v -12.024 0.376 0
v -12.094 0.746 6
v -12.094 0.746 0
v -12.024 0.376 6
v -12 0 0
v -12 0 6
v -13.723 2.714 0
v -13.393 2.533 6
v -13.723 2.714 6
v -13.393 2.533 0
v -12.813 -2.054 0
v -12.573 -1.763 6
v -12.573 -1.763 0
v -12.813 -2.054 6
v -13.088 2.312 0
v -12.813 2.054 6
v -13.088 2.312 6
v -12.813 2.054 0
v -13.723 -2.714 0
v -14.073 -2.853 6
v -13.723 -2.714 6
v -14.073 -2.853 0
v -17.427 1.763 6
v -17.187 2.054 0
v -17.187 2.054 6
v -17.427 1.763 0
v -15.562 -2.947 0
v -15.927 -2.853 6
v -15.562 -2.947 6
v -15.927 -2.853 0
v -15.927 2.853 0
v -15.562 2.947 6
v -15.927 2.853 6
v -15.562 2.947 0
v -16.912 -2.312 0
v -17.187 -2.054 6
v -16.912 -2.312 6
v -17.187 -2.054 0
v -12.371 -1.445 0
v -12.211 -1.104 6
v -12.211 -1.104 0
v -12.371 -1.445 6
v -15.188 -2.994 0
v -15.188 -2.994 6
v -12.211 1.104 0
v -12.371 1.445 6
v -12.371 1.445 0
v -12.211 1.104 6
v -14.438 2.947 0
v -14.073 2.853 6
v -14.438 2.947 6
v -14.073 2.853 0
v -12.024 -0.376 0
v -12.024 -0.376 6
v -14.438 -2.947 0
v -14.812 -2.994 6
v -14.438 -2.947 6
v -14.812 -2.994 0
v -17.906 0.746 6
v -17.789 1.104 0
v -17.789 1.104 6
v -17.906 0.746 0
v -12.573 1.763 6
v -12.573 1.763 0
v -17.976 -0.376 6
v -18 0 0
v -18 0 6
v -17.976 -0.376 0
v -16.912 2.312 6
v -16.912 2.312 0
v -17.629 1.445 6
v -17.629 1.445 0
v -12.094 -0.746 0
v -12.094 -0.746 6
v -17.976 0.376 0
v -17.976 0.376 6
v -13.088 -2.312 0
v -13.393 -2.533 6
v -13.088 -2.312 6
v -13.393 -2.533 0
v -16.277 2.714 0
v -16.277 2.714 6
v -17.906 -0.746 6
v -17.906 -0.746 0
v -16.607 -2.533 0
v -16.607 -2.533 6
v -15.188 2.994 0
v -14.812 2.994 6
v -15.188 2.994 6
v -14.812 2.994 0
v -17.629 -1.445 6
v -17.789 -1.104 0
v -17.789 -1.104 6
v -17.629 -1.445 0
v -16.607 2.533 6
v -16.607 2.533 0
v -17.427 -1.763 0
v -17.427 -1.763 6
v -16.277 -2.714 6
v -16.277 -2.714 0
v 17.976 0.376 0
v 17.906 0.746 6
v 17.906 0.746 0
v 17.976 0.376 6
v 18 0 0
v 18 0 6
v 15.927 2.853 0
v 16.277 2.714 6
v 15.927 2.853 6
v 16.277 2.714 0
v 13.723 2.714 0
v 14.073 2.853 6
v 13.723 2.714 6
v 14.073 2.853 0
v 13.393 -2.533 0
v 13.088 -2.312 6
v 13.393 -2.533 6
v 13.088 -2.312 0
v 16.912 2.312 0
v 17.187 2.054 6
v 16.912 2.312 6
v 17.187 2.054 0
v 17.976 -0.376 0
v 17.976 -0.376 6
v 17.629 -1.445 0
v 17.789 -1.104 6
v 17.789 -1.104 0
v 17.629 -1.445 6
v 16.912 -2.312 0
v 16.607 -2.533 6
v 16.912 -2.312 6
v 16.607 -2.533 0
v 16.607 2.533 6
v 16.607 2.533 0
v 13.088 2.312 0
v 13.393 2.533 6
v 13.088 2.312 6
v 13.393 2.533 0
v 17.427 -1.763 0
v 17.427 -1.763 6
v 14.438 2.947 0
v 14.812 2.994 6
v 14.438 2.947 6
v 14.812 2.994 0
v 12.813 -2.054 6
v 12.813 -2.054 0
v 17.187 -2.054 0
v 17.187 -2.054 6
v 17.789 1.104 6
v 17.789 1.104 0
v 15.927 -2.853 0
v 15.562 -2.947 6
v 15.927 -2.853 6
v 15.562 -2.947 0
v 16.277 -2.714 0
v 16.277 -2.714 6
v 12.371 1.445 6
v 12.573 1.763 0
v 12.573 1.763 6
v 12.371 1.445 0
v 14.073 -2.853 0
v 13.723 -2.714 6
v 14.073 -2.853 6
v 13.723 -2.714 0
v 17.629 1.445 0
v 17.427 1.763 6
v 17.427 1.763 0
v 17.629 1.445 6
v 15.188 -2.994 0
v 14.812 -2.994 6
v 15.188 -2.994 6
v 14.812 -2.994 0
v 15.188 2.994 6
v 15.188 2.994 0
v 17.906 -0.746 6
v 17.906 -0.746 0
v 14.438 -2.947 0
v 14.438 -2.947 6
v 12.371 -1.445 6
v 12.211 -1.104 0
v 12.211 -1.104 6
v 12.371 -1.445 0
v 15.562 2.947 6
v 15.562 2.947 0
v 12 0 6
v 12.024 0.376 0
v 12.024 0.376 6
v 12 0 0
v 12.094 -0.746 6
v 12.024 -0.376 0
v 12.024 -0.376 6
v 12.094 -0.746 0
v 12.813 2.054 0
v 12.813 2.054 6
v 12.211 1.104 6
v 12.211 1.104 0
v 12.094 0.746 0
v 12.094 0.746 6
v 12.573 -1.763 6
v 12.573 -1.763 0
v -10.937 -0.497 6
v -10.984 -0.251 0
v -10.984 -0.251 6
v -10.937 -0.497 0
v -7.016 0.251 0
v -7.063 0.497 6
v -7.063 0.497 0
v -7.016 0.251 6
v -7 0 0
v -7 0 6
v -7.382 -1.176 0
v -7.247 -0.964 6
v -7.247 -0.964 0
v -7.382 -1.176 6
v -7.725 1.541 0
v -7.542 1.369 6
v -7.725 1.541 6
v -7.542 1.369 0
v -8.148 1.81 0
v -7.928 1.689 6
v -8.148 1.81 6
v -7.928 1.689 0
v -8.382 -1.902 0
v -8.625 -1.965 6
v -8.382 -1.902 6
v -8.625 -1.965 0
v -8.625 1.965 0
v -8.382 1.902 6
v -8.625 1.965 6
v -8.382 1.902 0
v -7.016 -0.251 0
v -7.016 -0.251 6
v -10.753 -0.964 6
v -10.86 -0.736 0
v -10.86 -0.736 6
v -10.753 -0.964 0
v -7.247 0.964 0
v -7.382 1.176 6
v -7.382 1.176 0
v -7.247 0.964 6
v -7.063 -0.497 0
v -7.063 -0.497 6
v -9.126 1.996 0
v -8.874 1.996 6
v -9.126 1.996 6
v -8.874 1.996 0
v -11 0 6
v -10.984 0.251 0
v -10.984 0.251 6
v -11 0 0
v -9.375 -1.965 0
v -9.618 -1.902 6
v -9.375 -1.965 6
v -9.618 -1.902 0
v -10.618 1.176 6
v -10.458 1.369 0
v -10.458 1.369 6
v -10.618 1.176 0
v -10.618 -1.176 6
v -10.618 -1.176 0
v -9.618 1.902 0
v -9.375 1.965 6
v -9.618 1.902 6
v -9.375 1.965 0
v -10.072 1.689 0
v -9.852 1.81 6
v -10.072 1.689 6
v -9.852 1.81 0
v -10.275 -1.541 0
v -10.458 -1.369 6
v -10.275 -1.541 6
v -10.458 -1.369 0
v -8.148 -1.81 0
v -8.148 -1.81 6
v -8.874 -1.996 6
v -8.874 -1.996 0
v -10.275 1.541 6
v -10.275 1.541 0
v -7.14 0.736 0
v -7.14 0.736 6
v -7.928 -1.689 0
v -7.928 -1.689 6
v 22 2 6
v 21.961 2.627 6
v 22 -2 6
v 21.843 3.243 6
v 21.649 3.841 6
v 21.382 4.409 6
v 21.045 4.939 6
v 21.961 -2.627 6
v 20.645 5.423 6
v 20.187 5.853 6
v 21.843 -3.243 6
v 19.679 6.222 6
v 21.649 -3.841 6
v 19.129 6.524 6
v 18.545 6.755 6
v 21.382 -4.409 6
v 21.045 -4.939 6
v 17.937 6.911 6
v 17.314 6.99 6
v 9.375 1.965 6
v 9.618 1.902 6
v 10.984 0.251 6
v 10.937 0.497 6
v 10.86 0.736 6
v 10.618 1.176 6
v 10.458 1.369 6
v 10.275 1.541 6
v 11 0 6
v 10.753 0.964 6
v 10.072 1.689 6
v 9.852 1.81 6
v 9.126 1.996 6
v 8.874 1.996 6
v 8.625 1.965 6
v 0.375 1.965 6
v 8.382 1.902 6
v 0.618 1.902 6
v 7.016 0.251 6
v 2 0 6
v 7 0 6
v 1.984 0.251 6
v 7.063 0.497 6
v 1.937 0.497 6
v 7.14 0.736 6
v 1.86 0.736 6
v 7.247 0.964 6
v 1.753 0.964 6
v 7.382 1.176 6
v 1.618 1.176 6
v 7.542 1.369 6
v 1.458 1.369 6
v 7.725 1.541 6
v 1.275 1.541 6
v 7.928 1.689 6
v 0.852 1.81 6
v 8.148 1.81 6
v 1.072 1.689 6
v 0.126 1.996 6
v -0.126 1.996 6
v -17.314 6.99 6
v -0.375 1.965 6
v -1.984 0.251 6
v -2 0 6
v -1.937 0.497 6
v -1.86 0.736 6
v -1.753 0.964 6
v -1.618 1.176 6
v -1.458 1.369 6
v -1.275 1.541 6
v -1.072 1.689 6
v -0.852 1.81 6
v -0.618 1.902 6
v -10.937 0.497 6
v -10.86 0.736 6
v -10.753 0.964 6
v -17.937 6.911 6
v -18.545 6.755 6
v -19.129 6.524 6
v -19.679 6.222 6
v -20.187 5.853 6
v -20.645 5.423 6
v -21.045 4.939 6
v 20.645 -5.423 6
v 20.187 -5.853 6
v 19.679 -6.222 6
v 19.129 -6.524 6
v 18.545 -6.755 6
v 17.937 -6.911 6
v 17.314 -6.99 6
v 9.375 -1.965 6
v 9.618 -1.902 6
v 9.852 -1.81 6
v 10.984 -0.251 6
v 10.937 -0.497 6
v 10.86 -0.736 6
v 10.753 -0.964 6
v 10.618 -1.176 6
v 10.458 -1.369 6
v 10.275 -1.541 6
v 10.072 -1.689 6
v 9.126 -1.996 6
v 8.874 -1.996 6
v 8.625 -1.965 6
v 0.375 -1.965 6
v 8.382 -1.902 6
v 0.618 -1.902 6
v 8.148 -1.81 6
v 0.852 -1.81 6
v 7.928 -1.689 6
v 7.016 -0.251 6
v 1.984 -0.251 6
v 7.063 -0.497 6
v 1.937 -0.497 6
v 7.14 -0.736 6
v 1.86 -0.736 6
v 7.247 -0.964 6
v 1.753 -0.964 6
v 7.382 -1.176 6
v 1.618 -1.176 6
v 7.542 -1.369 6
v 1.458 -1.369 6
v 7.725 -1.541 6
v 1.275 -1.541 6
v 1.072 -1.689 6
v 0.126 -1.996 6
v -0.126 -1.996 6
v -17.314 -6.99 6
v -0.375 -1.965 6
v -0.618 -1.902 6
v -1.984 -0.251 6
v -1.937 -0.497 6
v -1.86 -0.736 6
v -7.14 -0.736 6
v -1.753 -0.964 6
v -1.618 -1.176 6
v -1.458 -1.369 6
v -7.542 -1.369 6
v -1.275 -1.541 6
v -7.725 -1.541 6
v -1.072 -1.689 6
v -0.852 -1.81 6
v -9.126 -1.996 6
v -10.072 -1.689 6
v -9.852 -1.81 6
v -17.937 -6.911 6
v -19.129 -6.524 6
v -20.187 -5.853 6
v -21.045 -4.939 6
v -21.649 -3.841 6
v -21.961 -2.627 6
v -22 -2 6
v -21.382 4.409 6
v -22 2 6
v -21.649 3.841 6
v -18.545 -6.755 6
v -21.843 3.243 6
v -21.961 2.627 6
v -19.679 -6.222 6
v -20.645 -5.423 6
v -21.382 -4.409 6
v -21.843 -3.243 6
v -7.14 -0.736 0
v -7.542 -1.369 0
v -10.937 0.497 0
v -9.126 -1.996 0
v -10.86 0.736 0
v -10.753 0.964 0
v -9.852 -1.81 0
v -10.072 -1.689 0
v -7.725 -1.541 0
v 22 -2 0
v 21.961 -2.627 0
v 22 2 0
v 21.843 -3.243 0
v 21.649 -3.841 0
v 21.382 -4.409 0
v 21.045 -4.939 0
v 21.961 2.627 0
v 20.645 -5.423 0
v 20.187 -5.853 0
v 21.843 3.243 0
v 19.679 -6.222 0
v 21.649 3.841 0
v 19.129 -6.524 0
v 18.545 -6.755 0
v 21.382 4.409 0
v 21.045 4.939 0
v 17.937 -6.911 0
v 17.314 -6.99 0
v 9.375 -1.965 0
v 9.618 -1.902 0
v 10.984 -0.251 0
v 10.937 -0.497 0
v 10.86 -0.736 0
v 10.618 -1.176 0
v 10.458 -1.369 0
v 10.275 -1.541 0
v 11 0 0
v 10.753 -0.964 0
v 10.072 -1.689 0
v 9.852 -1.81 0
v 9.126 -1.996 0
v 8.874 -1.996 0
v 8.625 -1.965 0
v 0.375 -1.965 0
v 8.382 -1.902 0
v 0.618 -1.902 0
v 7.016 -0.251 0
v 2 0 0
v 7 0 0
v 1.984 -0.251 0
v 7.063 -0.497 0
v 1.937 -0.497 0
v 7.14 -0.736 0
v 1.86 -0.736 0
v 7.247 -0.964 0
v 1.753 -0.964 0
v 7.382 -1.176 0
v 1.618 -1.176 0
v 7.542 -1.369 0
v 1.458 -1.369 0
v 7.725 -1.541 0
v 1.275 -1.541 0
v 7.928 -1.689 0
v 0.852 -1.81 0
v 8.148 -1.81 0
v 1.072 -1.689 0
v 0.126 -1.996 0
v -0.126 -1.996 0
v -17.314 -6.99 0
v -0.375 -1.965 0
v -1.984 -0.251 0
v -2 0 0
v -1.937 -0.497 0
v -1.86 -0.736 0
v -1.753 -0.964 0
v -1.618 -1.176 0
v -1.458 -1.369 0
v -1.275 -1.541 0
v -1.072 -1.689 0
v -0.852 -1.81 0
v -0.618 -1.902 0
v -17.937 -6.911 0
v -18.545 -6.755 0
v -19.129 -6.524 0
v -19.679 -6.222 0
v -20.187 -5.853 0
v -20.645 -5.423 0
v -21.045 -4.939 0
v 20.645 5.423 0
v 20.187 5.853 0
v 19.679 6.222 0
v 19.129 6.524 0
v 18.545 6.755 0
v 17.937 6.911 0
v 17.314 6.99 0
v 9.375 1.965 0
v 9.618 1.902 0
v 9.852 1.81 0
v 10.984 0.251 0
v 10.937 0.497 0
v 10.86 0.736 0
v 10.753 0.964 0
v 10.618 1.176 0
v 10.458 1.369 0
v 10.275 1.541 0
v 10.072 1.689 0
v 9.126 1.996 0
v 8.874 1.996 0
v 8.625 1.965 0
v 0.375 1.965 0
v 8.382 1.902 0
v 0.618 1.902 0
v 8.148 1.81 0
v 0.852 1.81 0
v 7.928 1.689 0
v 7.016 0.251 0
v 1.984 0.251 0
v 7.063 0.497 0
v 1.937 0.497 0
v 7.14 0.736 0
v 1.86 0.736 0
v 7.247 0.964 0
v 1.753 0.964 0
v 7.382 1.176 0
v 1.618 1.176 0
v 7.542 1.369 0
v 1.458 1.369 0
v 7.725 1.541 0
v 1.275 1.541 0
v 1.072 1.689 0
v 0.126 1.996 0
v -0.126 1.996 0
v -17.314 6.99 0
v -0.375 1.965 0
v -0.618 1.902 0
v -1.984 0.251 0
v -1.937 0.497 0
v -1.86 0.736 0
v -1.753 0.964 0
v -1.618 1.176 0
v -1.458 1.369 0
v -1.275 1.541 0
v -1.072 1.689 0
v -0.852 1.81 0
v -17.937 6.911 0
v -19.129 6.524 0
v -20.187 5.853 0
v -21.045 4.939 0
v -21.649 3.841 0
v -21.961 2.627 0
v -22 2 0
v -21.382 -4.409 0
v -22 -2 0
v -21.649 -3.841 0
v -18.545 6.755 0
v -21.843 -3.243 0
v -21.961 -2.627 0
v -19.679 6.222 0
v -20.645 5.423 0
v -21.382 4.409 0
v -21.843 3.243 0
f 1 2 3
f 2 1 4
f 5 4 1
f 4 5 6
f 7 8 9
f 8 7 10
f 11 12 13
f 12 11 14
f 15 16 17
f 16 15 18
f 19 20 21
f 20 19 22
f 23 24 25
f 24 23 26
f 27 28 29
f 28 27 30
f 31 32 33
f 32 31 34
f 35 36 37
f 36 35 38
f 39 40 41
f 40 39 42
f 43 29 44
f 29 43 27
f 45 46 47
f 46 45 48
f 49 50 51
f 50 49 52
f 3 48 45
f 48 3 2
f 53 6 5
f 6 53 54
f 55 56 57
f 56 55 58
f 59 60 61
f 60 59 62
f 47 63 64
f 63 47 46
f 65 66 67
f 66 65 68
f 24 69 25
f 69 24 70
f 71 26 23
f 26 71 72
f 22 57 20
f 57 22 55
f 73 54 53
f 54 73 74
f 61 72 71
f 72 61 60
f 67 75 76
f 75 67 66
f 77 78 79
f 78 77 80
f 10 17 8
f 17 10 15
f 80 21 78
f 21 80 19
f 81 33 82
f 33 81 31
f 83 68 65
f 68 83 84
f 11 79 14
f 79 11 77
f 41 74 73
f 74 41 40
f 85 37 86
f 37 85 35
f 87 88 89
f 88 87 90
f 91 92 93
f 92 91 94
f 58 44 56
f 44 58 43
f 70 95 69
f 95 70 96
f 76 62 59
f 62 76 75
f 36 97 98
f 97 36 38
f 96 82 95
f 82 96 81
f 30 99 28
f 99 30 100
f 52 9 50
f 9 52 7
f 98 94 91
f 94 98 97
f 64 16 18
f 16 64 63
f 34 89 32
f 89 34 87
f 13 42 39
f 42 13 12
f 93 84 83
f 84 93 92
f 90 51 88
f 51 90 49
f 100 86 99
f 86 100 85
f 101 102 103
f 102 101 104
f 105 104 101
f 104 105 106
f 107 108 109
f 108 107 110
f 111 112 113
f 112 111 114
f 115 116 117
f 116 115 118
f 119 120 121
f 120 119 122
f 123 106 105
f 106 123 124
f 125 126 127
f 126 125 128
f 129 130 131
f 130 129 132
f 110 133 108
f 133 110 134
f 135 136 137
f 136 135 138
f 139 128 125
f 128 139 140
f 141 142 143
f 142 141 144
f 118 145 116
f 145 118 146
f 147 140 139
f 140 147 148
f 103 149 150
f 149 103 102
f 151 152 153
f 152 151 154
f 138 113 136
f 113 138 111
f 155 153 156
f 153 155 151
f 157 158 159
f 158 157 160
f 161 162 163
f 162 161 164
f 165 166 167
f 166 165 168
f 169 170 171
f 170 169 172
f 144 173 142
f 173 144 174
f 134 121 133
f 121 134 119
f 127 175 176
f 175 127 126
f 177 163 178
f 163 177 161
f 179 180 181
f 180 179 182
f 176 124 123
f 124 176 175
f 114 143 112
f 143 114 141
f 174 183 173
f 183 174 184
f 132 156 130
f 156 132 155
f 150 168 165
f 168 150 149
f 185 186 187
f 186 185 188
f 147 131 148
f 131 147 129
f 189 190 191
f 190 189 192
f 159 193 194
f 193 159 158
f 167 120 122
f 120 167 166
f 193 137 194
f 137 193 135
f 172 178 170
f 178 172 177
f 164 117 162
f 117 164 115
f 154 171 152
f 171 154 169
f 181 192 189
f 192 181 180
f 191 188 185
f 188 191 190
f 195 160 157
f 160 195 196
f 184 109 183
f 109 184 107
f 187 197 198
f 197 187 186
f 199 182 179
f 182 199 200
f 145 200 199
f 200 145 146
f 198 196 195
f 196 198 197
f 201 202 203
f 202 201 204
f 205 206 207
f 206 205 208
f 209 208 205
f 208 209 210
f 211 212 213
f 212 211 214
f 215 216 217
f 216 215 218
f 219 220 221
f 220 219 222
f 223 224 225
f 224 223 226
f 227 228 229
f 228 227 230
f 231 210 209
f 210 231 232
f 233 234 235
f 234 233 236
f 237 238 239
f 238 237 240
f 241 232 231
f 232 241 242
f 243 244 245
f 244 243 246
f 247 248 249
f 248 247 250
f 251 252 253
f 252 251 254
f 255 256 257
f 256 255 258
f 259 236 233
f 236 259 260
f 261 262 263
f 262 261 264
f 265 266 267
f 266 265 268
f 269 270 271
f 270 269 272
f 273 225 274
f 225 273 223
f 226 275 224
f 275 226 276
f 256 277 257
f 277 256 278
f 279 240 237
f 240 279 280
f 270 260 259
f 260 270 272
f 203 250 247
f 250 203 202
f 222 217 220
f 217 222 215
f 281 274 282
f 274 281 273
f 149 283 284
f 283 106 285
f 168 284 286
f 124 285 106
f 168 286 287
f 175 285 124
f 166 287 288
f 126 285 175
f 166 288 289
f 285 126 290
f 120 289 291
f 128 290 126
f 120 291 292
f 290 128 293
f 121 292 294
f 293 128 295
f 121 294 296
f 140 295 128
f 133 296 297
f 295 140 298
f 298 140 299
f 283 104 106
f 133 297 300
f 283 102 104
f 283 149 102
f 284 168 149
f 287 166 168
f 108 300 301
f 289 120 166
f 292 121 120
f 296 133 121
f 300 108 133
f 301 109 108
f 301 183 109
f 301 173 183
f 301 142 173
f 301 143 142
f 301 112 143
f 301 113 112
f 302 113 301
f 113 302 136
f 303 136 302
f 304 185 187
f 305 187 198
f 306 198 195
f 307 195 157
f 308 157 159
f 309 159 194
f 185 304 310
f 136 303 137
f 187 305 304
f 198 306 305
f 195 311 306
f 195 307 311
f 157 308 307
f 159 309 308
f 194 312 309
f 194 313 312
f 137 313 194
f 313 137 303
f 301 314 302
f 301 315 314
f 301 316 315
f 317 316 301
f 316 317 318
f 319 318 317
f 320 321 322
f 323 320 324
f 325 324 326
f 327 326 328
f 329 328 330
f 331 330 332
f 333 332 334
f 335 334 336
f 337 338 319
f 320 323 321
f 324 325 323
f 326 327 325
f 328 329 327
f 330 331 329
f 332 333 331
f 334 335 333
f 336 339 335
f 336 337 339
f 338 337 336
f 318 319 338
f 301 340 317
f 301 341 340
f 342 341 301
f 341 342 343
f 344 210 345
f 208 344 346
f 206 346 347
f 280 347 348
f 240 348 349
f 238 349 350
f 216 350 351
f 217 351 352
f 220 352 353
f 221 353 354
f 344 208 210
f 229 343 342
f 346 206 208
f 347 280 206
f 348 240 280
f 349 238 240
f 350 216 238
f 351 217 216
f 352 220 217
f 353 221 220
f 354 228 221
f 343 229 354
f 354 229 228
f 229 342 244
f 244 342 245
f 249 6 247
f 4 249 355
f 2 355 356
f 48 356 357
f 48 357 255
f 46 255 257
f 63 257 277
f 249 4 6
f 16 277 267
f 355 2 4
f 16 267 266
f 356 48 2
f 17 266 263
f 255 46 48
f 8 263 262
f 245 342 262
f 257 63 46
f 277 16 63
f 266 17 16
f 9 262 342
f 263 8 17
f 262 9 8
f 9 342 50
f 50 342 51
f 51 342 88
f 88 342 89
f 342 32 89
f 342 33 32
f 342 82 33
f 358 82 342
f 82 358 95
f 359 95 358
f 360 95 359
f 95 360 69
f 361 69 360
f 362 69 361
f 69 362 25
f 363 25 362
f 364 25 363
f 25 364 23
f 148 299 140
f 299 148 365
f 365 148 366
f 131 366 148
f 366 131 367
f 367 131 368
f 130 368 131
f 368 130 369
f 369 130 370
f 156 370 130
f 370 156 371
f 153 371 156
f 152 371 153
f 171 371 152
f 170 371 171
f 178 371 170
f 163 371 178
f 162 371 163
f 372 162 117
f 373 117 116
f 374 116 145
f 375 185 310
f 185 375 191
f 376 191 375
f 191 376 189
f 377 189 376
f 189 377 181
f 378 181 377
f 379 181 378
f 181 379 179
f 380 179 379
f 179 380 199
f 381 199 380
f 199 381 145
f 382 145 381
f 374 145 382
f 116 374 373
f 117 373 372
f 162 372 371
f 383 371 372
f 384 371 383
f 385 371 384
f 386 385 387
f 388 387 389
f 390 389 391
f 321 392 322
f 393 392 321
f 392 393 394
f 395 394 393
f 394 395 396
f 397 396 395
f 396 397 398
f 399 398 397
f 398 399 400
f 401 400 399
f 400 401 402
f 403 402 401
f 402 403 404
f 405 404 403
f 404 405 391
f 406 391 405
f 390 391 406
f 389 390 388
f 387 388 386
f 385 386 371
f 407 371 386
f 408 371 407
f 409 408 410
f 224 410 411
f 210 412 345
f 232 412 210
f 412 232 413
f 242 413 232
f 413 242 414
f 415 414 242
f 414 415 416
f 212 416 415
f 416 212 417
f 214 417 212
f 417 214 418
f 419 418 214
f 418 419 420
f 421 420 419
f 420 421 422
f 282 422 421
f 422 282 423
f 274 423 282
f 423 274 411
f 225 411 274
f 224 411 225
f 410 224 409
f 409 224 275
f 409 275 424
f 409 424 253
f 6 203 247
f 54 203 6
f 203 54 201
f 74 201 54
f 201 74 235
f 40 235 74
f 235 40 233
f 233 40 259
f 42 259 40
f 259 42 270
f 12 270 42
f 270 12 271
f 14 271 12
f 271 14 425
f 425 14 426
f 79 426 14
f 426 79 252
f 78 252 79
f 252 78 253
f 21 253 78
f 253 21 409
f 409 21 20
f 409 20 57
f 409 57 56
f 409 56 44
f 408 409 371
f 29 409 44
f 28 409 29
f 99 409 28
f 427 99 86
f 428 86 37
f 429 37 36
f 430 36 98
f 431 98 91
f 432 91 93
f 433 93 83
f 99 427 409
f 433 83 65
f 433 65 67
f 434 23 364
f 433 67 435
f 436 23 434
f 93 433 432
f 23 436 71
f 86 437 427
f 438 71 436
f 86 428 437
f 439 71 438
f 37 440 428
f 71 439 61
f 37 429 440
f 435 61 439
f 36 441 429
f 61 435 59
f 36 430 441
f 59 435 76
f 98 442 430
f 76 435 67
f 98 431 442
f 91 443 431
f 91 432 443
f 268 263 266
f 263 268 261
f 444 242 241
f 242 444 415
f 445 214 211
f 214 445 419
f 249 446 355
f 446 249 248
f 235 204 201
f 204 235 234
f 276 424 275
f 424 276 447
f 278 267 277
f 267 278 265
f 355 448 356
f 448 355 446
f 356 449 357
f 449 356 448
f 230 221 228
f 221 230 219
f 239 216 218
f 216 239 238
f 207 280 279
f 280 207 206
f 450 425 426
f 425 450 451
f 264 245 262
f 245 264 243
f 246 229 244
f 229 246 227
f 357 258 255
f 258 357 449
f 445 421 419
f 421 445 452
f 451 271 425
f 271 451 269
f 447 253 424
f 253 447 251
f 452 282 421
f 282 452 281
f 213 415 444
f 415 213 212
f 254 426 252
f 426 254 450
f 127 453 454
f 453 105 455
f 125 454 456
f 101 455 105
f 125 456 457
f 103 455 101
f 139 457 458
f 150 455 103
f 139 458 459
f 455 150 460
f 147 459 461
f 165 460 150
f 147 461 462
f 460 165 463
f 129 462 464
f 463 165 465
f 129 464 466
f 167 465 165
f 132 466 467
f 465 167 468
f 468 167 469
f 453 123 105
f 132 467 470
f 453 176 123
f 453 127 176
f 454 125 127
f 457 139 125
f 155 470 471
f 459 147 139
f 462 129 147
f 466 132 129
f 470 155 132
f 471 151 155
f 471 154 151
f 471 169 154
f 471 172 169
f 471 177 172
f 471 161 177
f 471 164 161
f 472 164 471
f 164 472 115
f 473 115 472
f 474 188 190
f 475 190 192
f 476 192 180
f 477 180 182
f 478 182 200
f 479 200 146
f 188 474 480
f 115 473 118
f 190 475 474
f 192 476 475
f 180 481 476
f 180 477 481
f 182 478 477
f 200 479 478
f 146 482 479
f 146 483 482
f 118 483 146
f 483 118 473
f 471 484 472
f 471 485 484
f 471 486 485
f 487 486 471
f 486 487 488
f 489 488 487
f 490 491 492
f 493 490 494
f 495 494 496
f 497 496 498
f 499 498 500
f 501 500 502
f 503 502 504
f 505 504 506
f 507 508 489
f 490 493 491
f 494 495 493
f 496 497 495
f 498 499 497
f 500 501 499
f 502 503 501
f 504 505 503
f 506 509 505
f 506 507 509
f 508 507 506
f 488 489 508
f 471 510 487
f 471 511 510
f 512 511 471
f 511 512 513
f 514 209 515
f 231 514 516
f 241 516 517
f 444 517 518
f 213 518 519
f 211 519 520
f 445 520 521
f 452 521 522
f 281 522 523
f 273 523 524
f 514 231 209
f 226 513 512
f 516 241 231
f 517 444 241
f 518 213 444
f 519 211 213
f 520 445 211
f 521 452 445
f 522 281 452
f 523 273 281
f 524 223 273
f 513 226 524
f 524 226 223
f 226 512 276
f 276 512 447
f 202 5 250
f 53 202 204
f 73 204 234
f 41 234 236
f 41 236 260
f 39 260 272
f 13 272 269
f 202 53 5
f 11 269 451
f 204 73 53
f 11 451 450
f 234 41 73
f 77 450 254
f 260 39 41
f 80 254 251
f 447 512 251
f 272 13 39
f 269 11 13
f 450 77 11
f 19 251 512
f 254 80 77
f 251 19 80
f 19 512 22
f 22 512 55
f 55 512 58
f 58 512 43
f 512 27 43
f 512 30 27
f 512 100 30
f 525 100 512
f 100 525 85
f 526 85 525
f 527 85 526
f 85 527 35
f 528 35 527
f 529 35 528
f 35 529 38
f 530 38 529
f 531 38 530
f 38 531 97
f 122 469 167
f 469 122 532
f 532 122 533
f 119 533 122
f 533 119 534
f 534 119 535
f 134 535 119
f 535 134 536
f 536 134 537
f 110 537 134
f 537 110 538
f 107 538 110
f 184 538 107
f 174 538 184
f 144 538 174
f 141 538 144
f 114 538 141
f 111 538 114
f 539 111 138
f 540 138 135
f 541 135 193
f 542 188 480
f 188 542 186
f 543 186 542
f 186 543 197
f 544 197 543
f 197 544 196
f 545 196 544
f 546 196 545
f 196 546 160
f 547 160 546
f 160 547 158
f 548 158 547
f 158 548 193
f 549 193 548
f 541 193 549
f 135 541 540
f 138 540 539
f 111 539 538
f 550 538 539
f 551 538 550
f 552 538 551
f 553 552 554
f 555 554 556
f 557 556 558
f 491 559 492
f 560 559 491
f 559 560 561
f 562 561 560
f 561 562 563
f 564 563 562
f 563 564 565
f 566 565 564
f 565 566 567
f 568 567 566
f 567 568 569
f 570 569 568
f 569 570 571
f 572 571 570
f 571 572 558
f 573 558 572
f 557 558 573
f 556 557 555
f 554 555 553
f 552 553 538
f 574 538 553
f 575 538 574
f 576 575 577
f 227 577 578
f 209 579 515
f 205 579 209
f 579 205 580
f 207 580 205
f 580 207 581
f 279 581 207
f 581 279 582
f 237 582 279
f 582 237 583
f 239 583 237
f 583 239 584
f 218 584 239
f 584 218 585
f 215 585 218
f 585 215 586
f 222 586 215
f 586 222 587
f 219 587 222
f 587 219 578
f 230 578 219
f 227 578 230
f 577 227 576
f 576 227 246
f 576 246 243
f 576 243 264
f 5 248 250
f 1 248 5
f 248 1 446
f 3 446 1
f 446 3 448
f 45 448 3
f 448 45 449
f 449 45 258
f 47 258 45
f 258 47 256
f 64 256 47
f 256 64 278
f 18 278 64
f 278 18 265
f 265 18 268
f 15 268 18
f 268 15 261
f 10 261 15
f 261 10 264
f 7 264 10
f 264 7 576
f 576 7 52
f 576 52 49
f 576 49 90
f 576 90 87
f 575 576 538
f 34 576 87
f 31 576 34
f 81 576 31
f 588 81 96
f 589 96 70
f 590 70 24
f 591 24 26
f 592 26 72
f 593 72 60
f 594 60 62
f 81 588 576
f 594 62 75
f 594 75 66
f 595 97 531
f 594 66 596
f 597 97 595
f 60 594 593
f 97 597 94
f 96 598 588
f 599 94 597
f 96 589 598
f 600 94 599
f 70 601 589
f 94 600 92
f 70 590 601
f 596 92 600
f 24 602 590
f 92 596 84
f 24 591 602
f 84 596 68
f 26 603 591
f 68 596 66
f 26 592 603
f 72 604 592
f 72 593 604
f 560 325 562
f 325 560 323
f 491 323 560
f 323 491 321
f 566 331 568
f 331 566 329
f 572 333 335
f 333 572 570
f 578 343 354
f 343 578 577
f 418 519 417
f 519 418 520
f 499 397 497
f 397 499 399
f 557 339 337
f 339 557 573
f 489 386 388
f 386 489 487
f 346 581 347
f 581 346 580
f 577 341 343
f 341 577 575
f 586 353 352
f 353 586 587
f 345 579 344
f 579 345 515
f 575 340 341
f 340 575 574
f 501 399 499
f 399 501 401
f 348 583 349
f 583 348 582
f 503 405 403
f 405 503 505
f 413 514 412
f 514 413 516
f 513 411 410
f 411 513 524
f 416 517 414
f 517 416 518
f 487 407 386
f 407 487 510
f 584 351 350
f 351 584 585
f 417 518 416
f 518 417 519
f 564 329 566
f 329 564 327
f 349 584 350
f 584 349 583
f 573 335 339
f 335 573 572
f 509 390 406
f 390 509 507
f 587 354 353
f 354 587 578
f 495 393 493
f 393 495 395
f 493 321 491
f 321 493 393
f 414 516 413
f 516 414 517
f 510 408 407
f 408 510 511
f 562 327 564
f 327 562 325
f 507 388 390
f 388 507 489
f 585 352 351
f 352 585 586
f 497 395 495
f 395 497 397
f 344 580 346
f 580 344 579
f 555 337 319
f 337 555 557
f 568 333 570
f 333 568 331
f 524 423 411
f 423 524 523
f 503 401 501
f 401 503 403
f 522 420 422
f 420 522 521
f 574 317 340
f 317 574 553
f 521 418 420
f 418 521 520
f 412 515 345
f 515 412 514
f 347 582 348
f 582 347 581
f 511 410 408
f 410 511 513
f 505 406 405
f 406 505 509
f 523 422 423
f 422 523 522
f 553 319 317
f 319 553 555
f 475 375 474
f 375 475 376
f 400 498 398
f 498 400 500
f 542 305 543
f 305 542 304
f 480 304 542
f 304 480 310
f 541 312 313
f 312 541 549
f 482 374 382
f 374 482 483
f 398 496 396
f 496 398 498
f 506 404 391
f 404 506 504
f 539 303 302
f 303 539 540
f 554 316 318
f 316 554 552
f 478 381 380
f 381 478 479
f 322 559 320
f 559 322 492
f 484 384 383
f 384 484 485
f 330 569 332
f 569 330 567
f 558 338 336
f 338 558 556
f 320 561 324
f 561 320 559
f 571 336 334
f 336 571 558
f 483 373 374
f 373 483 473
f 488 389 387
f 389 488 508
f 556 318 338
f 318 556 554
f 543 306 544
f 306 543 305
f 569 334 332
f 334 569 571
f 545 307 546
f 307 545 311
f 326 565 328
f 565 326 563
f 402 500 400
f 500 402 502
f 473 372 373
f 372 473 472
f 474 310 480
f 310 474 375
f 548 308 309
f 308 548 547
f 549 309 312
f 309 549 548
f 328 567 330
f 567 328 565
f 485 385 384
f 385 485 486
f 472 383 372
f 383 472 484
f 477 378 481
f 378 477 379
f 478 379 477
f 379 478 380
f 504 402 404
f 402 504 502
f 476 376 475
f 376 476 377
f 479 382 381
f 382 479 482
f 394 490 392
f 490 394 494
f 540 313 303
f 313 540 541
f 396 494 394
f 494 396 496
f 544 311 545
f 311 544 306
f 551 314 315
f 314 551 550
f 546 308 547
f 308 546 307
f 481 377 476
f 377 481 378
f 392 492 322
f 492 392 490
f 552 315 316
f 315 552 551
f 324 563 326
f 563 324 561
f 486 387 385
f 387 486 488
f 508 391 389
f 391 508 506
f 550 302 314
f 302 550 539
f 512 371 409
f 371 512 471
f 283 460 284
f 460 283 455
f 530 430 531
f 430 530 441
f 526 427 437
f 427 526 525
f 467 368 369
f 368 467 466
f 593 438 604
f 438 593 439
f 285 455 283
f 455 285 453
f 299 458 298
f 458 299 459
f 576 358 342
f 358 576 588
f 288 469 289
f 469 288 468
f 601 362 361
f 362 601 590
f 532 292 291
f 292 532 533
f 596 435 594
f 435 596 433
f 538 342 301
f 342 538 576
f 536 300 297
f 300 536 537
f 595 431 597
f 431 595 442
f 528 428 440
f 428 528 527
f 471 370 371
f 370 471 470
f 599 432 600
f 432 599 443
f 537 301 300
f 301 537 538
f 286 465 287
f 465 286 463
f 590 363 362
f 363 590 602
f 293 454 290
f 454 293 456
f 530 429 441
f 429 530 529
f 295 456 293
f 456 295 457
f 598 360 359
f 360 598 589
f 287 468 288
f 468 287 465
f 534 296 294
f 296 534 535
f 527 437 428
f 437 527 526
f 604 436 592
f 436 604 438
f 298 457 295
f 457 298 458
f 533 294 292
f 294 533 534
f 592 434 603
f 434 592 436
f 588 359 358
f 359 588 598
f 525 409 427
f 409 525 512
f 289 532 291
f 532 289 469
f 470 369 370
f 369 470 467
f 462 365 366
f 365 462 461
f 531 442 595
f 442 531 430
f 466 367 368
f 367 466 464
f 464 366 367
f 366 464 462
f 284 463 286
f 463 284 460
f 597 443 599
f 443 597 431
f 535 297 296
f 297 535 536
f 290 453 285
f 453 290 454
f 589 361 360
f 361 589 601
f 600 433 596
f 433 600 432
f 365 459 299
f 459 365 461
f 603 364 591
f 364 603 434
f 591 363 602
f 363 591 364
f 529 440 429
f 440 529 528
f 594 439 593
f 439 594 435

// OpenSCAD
$fn = 50;


difference() {
	union() {
		hull() {
			translate(v = [-17.0000000000, 2.0000000000, 0]) {
				cylinder(h = 6, r = 5);
			}
			translate(v = [17.0000000000, 2.0000000000, 0]) {
				cylinder(h = 6, r = 5);
			}
			translate(v = [-17.0000000000, -2.0000000000, 0]) {
				cylinder(h = 6, r = 5);
			}
			translate(v = [17.0000000000, -2.0000000000, 0]) {
				cylinder(h = 6, r = 5);
			}
		}
	}
	union() {
		#translate(v = [-15.0000000000, 0.0000000000, 0]) {
			cylinder(h = 6, r = 3.0000000000);
		}
		#translate(v = [15.0000000000, 0.0000000000, 0]) {
			cylinder(h = 6, r = 3.0000000000);
		}
		#translate(v = [-15.0000000000, 0.0000000000, -100.0000000000]) {
			cylinder(h = 200, r = 3.0000000000);
		}
		#translate(v = [-15.0000000000, 0.0000000000, -100.0000000000]) {
			cylinder(h = 200, r = 3.0000000000);
		}
		#translate(v = [15.0000000000, 0.0000000000, -100.0000000000]) {
			cylinder(h = 200, r = 3.0000000000);
		}
		#translate(v = [15.0000000000, 0.0000000000, -100.0000000000]) {
			cylinder(h = 200, r = 3.0000000000);
		}
		#translate(v = [-15.0000000000, 0.0000000000, 0]) {
			cylinder(h = 6, r = 1.5000000000);
		}
		#translate(v = [15.0000000000, 0.0000000000, 0]) {
			cylinder(h = 6, r = 1.5000000000);
		}
		#translate(v = [-15.0000000000, 0.0000000000, 0]) {
			cylinder(h = 6, r = 1.5000000000);
		}
		#translate(v = [15.0000000000, 0.0000000000, 0]) {
			cylinder(h = 6, r = 1.5000000000);
		}
		#translate(v = [-15.0000000000, 0.0000000000, 0]) {
			cylinder(h = 6, r = 1.5000000000);
		}
		#translate(v = [15.0000000000, 0.0000000000, 0]) {
			cylinder(h = 6, r = 1.5000000000);
		}
		#translate(v = [-9.0000000000, 0, 0]) {
			cylinder(h = 6, r = 2.0000000000);
		}
		#cylinder(h = 6, r = 2.0000000000);
		#translate(v = [9.0000000000, 0, 0]) {
			cylinder(h = 6, r = 2.0000000000);
		}
	}
}
